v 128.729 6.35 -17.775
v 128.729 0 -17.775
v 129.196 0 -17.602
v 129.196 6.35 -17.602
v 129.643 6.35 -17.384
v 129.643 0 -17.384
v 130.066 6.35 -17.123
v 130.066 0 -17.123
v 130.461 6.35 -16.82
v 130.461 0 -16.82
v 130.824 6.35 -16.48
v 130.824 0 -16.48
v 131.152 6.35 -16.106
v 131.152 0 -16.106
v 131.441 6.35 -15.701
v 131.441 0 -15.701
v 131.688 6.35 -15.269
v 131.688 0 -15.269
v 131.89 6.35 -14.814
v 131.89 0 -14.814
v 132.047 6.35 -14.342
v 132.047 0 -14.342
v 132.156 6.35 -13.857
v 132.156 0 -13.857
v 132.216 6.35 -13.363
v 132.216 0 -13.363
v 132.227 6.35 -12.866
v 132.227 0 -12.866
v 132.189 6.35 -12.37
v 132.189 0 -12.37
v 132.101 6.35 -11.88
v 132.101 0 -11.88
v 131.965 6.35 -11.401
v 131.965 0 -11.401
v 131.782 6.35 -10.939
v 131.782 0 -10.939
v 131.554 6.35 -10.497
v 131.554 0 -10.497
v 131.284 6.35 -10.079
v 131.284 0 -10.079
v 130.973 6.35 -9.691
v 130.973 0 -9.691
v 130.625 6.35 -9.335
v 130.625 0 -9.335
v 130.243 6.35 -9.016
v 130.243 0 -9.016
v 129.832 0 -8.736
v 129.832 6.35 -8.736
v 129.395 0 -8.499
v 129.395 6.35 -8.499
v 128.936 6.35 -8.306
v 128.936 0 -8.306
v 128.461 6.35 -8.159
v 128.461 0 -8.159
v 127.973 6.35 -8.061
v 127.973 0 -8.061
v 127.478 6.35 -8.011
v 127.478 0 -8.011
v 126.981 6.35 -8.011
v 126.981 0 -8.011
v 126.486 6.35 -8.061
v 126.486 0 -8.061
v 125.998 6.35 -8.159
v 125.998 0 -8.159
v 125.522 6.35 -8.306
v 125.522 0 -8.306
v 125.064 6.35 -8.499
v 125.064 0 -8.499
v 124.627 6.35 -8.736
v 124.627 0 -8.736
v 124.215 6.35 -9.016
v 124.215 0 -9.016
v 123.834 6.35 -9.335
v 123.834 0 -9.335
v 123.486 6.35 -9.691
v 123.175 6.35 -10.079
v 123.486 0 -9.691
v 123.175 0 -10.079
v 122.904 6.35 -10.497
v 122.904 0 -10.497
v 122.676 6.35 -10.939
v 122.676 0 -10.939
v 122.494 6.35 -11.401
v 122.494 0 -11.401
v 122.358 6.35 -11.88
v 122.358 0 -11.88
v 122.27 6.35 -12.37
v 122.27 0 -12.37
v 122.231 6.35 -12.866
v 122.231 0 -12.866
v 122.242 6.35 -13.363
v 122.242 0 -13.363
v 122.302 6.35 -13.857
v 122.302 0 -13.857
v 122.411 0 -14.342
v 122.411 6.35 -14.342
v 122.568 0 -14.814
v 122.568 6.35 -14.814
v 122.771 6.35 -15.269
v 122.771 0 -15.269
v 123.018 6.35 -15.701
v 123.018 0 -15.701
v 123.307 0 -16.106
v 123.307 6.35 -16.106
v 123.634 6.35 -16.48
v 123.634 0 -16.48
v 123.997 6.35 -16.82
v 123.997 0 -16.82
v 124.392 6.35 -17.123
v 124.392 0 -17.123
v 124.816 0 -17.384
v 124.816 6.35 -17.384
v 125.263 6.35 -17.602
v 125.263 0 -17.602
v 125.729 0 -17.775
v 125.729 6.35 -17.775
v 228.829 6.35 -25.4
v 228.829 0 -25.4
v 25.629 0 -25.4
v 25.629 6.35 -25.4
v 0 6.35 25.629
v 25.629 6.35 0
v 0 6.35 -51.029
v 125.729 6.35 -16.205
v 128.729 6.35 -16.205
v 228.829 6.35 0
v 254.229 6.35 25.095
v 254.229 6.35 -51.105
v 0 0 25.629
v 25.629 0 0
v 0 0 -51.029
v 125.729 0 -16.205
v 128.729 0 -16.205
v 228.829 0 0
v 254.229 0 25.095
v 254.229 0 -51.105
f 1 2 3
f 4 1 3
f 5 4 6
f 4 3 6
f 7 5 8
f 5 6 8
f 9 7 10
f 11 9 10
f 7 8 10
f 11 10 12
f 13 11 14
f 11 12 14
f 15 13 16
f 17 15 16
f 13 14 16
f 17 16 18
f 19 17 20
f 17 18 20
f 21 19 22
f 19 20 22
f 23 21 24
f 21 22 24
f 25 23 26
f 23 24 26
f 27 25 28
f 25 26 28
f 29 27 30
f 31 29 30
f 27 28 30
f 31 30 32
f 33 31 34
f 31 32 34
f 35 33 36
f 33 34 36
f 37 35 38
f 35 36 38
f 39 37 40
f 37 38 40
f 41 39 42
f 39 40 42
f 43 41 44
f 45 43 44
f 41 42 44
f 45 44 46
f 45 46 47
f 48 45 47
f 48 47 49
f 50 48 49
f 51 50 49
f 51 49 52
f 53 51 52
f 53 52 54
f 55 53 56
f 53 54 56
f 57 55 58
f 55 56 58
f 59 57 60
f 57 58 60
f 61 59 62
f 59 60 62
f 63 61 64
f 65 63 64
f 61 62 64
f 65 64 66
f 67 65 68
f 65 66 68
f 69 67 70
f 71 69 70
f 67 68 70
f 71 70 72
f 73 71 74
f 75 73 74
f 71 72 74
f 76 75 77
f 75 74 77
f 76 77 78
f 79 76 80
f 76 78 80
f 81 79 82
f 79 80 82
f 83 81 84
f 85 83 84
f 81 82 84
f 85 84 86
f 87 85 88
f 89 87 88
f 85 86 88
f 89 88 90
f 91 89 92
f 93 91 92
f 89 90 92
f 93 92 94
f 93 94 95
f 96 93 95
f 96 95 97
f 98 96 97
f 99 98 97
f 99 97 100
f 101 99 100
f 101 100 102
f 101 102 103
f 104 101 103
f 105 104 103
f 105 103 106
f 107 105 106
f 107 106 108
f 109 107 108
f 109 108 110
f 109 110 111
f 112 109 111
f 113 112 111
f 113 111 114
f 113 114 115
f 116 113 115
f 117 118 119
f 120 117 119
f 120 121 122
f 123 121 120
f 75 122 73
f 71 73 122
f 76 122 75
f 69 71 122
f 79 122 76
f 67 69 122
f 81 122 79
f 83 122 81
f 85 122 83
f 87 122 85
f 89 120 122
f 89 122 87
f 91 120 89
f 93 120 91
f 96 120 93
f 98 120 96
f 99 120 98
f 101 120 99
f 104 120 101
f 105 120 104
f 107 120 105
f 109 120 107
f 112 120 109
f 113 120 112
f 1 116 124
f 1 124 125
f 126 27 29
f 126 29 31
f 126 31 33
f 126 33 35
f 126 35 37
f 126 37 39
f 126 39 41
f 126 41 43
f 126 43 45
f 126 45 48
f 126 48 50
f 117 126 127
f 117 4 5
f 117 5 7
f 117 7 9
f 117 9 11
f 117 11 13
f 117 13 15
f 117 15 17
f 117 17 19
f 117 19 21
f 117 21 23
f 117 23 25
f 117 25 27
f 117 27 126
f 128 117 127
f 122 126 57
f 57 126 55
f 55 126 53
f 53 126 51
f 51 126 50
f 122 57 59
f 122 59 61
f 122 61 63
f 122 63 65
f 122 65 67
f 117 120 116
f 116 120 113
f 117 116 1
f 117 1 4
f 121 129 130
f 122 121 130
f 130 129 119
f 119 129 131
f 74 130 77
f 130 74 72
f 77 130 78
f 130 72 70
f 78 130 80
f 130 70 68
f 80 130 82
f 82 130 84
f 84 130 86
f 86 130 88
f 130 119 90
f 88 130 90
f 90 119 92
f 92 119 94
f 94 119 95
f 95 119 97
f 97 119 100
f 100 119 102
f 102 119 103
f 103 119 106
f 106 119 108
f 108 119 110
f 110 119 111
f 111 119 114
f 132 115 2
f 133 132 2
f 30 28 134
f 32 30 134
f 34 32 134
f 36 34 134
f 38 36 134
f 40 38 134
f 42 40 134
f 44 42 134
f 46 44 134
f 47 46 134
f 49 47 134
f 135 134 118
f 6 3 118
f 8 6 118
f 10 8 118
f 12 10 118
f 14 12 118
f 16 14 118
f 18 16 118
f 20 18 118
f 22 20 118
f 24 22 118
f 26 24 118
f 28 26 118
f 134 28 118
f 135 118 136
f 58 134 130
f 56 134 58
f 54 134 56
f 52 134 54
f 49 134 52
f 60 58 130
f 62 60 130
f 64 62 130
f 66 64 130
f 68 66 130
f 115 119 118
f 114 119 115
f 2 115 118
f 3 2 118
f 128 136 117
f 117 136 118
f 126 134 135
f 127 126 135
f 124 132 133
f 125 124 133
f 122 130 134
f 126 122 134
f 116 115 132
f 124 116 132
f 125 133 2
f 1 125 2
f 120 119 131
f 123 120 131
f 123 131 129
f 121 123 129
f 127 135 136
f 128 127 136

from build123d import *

# Parameters (mm, degrees)
BOSS_EXTRUDE2_DEPTH = 6.35


with BuildPart() as part:
    # Sketch1 → Boss-Extrude2 (new body)
    with BuildSketch(Plane(origin=(0, 0, 0), x_dir=(1, 0, 0), z_dir=(0, 1, 0))):
        Polygon((0, 51.029291752), (0, -25.629291752), (25.629291752, 0), (228.829291752, 0), (254.229291752, -25.094710057), (254.229291752, 51.105289943), (228.829291752, 25.4), (25.629291752, 25.4), align=None)
        with BuildLine():
            Line((125.729291752, 17.77498595), (125.729291752, 16.205289943))
            Line((125.729291752, 16.205289943), (128.729291752, 16.205289943))
            Line((128.729291752, 16.205289943), (128.729291752, 17.77498595))
            ThreePointArc((128.729291752, 17.77498595), (127.229291752, 8.005289943), (125.729291752, 17.77498595))
        make_face(mode=Mode.SUBTRACT)
    extrude(amount=BOSS_EXTRUDE2_DEPTH)


solid = part.part
